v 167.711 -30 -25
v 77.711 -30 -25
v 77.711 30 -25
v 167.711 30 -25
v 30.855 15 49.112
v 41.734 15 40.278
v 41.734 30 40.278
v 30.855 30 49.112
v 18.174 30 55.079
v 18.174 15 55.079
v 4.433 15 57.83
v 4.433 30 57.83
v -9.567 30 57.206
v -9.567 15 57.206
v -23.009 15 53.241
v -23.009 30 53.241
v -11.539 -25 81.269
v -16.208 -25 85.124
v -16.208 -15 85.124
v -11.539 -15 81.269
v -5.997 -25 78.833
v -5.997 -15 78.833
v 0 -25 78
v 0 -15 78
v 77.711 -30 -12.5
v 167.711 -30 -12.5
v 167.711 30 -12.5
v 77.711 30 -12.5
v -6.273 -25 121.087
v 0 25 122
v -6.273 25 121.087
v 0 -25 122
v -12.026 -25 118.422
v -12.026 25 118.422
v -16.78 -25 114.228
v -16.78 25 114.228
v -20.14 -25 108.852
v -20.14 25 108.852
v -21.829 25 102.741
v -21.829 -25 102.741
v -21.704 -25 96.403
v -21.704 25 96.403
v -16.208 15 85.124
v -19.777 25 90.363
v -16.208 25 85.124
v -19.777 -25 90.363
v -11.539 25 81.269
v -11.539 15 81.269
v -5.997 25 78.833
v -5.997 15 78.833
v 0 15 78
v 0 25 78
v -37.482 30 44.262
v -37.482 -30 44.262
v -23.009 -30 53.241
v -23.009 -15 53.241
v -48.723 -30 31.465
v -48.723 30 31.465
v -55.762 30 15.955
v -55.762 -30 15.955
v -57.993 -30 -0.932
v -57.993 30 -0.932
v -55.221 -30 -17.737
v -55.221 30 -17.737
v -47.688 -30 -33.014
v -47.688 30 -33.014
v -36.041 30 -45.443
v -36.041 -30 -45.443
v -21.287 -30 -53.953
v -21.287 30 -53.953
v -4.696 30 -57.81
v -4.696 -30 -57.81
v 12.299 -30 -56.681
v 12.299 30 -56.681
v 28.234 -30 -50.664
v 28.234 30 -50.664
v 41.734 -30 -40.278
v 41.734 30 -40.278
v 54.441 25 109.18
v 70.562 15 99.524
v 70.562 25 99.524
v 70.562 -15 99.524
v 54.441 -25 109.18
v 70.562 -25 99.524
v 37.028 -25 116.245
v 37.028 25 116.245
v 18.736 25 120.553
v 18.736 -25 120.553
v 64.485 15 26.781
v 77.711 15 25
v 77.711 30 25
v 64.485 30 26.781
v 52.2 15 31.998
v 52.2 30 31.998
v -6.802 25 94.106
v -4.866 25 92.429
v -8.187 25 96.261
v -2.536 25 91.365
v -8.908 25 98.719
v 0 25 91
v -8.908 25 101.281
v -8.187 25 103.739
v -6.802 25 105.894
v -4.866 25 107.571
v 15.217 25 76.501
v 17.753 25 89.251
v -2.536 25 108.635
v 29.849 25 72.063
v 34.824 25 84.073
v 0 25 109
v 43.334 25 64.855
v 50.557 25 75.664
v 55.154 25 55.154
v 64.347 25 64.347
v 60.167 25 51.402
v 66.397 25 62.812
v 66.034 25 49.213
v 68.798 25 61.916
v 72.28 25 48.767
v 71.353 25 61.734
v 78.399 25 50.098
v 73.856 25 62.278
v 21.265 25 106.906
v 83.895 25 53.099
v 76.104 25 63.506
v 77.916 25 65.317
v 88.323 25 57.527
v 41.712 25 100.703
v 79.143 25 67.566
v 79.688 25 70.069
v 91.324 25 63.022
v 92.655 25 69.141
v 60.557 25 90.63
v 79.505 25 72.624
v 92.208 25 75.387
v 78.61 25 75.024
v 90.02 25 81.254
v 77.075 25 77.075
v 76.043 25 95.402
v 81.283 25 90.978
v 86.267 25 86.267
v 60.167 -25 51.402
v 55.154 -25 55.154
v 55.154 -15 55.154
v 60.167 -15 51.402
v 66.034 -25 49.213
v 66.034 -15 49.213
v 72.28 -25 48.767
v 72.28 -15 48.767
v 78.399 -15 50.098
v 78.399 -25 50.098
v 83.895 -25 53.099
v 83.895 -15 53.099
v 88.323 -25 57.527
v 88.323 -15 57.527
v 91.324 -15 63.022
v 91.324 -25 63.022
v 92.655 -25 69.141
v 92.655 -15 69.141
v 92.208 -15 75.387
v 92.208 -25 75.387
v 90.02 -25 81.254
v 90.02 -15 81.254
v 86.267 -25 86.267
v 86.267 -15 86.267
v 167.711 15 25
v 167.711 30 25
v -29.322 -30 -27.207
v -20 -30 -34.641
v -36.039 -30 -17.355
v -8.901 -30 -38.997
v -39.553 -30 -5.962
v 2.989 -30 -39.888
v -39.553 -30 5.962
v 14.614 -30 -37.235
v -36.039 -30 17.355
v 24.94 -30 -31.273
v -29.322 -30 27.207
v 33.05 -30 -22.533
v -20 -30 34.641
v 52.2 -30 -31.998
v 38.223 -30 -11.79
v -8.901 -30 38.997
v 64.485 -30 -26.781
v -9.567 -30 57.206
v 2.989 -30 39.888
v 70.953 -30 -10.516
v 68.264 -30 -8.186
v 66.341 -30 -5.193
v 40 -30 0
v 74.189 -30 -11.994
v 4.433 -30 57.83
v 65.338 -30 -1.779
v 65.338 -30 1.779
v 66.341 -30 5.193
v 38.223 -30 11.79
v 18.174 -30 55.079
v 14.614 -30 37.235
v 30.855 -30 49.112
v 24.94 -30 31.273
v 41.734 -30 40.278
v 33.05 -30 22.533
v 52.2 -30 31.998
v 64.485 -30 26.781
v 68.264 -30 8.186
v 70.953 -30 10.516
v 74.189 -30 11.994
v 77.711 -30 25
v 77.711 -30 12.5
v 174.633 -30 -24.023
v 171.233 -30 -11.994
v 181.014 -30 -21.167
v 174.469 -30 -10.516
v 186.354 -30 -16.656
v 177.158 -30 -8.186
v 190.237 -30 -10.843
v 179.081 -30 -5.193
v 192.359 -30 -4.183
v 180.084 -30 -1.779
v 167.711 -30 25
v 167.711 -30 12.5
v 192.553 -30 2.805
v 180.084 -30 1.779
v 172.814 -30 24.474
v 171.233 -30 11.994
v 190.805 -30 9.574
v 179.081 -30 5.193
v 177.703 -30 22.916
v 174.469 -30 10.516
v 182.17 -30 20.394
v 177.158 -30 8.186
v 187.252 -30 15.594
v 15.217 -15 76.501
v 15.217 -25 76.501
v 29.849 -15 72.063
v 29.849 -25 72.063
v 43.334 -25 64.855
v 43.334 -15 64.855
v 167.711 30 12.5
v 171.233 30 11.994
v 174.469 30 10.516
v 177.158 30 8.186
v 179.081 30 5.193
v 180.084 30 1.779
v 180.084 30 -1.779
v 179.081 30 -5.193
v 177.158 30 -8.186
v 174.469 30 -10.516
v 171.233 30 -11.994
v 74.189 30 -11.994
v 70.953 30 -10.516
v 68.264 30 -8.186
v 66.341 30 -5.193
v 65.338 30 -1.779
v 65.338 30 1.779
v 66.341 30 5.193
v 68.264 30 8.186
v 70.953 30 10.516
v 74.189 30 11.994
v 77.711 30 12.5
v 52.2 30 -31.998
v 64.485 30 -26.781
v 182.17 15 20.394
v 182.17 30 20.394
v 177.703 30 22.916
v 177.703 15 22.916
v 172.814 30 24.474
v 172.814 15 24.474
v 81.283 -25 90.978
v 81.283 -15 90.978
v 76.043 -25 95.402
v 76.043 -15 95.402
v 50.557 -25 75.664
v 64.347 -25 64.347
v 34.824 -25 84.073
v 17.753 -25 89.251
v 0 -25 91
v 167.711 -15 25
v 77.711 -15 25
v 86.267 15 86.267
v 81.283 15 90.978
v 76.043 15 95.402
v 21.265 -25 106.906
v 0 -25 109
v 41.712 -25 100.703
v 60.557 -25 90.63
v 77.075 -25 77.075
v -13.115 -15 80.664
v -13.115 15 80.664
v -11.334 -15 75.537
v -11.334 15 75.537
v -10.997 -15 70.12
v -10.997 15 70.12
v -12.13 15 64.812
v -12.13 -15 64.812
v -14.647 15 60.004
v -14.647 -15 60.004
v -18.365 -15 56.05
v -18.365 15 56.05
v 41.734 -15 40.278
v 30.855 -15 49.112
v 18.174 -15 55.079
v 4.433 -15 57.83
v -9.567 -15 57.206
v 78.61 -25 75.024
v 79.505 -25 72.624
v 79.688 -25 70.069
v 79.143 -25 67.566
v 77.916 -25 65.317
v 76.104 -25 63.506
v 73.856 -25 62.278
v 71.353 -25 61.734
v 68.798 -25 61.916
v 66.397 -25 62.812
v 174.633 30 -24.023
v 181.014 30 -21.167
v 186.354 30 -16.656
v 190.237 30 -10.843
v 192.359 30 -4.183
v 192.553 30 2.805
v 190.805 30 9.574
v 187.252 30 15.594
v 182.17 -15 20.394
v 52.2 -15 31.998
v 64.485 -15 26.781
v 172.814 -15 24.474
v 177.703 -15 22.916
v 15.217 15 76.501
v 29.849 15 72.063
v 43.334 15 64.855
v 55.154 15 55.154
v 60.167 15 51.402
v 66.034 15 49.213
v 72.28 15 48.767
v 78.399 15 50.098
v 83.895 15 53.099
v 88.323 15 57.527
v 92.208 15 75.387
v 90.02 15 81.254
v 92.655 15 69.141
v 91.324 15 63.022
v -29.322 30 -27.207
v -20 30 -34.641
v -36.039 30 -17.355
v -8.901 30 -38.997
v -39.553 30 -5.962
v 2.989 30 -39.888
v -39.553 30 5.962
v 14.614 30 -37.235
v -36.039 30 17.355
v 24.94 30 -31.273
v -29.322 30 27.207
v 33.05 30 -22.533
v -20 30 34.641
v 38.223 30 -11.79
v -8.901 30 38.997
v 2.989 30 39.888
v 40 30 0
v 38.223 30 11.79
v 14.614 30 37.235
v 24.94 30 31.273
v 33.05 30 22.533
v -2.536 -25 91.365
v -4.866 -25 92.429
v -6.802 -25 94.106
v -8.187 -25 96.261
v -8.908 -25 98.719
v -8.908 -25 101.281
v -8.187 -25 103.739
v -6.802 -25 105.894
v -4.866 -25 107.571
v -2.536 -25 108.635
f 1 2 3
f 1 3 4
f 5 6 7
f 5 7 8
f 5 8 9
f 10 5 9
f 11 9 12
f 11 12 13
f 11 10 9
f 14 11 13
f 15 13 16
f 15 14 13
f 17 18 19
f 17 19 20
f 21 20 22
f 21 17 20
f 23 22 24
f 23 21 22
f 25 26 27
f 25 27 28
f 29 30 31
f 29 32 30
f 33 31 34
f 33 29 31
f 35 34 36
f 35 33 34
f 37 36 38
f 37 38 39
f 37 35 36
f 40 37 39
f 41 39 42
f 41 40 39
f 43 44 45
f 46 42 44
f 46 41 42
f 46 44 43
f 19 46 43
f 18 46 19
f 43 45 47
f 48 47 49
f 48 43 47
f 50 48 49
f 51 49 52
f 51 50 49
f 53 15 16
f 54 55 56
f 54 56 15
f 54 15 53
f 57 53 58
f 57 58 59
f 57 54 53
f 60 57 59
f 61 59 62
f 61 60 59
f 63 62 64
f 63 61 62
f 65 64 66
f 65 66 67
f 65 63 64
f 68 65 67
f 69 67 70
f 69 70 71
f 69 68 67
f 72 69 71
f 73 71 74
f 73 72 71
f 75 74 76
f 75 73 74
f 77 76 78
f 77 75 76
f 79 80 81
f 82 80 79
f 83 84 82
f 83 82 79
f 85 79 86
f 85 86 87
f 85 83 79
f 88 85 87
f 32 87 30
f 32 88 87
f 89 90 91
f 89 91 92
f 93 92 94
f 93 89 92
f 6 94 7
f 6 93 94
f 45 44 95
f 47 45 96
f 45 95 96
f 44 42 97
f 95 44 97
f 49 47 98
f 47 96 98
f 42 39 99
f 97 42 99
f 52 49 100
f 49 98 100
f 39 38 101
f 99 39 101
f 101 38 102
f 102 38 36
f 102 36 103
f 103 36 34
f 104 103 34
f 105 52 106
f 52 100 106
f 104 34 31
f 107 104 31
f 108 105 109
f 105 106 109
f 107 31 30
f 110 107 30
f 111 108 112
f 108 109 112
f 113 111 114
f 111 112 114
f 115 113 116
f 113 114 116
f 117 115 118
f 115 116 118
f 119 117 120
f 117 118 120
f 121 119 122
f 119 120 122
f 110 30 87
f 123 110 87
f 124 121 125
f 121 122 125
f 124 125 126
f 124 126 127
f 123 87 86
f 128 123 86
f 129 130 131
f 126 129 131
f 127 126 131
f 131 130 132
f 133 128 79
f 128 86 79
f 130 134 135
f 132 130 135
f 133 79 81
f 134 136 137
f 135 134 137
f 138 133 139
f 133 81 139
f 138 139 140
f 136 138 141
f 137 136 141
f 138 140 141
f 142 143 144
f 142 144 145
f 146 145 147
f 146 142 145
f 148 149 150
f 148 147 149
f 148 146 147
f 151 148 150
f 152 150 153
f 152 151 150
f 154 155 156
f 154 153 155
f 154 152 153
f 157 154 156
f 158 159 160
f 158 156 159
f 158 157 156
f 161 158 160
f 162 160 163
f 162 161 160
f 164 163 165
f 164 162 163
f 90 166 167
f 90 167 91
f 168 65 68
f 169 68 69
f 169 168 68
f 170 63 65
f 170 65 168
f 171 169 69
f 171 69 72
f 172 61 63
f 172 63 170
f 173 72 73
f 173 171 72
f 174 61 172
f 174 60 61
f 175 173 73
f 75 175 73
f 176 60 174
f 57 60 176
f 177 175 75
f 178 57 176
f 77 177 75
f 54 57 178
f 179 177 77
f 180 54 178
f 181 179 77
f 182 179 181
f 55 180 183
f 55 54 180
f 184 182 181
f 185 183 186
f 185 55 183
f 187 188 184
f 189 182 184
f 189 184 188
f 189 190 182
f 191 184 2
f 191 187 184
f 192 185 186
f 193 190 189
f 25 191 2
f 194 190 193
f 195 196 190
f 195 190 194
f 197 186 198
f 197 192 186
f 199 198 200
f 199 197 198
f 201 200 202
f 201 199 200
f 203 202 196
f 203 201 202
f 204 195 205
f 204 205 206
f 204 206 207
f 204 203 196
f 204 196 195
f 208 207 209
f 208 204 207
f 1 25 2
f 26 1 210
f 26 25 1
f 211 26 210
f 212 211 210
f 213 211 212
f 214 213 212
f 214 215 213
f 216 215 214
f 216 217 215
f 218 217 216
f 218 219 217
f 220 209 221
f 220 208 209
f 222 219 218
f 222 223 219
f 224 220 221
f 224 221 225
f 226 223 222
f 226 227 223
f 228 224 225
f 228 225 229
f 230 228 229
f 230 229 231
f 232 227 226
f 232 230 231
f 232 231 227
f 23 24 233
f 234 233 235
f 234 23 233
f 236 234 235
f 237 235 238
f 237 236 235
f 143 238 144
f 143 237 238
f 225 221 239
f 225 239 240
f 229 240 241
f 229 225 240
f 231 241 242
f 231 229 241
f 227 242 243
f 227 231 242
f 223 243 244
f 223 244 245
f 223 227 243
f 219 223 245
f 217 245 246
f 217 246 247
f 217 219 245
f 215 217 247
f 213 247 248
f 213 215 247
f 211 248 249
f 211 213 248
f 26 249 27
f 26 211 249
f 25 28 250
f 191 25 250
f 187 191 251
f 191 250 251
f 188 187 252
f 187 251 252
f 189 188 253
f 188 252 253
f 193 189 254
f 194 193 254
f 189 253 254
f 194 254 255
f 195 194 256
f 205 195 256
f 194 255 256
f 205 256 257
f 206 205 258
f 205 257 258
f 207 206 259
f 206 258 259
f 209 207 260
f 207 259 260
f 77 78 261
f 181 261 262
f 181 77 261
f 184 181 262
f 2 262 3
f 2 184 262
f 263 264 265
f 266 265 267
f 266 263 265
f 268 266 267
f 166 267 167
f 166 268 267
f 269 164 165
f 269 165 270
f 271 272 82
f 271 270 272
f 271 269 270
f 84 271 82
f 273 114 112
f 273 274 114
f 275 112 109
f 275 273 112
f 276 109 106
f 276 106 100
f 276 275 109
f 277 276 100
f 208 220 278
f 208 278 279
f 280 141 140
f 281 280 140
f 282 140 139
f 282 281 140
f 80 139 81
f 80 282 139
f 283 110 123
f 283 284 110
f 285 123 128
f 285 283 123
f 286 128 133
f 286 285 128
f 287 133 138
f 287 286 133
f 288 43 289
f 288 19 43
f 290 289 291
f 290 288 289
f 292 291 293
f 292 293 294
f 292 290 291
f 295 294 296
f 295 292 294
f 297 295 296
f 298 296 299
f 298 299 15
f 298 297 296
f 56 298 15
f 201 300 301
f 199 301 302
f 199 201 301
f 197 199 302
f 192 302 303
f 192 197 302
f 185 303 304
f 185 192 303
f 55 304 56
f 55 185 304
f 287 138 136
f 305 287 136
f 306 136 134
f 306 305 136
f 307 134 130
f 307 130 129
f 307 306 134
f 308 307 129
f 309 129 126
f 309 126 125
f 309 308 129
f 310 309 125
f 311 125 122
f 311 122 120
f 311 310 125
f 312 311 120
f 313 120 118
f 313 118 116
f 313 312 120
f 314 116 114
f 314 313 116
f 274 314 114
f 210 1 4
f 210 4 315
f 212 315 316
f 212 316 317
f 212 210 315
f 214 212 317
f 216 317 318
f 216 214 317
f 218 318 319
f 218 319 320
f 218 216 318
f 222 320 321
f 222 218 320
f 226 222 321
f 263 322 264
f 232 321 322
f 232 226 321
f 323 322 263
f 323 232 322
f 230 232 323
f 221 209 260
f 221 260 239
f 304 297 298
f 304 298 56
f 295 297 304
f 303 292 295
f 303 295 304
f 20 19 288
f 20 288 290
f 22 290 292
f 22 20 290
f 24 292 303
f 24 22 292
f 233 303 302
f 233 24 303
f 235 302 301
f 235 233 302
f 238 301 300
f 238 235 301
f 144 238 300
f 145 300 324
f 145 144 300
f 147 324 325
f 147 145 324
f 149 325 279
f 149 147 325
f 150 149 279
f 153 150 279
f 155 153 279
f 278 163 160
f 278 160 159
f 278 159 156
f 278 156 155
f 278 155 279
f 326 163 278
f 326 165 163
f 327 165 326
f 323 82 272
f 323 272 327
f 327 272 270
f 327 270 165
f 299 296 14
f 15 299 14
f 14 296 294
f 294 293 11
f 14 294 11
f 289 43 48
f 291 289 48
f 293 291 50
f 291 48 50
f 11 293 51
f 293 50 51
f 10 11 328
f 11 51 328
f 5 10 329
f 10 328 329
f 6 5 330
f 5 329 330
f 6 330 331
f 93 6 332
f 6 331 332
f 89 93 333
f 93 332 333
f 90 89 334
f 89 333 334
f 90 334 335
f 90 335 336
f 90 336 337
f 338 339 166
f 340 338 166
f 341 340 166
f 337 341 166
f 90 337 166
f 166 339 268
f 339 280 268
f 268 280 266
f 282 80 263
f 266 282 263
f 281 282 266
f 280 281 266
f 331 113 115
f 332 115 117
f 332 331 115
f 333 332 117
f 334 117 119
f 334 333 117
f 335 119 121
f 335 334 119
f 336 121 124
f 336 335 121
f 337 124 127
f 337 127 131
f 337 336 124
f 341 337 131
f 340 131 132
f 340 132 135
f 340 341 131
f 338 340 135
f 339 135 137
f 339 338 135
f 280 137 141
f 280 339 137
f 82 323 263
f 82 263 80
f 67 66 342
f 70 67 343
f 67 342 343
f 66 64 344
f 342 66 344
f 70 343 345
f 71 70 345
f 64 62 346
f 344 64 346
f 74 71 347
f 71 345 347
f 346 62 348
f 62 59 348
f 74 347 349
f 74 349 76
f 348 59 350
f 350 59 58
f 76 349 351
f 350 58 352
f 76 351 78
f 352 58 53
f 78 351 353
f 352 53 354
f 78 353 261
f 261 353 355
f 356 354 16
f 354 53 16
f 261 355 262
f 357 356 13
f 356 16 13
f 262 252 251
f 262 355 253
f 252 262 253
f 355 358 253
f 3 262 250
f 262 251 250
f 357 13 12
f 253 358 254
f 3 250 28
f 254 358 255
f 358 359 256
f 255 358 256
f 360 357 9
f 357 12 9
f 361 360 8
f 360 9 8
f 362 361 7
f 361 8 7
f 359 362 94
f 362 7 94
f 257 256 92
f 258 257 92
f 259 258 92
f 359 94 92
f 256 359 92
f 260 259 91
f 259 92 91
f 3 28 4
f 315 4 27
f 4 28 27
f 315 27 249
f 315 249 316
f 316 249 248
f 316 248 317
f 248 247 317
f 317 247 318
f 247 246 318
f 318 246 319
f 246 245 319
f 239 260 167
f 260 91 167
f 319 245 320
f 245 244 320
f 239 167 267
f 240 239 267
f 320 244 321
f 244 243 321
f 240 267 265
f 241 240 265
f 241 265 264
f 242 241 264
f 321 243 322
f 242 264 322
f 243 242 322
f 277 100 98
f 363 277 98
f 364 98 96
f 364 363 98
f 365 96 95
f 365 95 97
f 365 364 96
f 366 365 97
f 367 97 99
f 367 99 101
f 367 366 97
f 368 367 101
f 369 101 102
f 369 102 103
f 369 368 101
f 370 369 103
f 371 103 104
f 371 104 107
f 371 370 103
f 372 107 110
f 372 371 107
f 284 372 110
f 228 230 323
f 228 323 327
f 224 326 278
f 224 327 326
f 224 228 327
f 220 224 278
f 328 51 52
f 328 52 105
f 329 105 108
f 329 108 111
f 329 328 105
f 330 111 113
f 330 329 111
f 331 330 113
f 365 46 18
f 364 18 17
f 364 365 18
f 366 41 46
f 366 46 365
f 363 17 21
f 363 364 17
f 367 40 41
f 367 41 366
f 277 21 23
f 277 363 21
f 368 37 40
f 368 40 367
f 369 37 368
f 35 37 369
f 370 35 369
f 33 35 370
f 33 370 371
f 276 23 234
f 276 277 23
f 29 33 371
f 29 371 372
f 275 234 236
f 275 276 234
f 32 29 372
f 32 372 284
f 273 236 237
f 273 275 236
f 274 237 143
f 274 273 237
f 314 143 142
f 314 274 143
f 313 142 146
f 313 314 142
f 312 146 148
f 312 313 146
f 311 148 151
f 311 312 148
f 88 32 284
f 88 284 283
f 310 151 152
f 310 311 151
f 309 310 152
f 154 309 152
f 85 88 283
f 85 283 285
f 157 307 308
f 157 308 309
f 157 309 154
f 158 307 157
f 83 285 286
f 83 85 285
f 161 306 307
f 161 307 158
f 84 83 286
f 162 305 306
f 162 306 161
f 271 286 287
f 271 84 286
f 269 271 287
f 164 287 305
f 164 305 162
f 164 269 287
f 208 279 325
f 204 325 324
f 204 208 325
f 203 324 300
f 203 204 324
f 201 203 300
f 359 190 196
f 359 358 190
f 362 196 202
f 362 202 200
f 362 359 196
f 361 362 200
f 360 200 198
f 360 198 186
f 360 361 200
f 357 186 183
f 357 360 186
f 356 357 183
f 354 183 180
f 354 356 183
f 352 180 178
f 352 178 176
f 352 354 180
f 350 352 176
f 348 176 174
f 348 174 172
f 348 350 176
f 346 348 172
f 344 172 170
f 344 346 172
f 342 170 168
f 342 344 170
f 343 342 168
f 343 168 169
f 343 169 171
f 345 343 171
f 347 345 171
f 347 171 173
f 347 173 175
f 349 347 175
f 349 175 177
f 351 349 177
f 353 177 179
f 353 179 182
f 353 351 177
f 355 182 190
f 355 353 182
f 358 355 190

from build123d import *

# Parameters (mm, degrees)
F0_R     = 40
F1_DEPTH = 30
F2_DEPTH = 15
F3_DEPTH = 25


with BuildPart() as f1:
    # F0 (on Front) → F1 (new body, symmetric)
    with BuildSketch(Plane.XZ):
        with BuildLine():
            ThreePointArc((41.733687, -40.277778), (58.167604, -28.977662), (77.711003, -25))
            Line((77.711003, -25), (167.711003, -25))
            ThreePointArc((167.711003, -25), (191.531756, -7.587605), (182.1704, 20.39426))
            ThreePointArc((182.1704, 20.39426), (175.298608, 23.820752), (167.711003, 25))
            Line((167.711003, 25), (77.711003, 25))
            ThreePointArc((77.711003, 25), (58.167604, 28.977662), (41.733687, 40.277778))
            ThreePointArc((41.733687, 40.277778), (11.387237, 56.871177), (-23.008546, 53.241026))
            ThreePointArc((-23.008546, 53.241026), (-47.687518, -33.013643), (41.733687, -40.277778))
        make_face()
        Circle(F0_R, mode=Mode.SUBTRACT)
        with BuildLine():
            ThreePointArc((77.711003, -12.5), (65.211003, 0), (77.711003, 12.5))
            Line((77.711003, 12.5), (167.711003, 12.5))
            ThreePointArc((167.711003, 12.5), (180.211003, 0), (167.711003, -12.5))
            Line((167.711003, -12.5), (77.711003, -12.5))
        make_face(mode=Mode.SUBTRACT)
    extrude(amount=F1_DEPTH, both=True)

    # F0 (on Front) → F2 (join, symmetric)
    with BuildSketch(Plane.XZ):
        with BuildLine():
            ThreePointArc((-16.207991, 85.12381), (-11.382532, 67.427879), (-23.008546, 53.241026))
            ThreePointArc((-23.008546, 53.241026), (11.387237, 56.871177), (41.733687, 40.277778))
            ThreePointArc((41.733687, 40.277778), (58.167604, 28.977662), (77.711003, 25))
            Line((77.711003, 25), (167.711003, 25))
            ThreePointArc((167.711003, 25), (175.298608, 23.820752), (182.1704, 20.39426))
            Line((182.1704, 20.39426), (70.561858, 99.523988))
            ThreePointArc((70.561858, 99.523988), (78.694101, 93.226812), (86.267027, 86.267027))
            ThreePointArc((86.267027, 86.267027), (86.267027, 55.154329), (55.154329, 55.154329))
            ThreePointArc((55.154329, 55.154329), (29.849308, 72.062604), (0, 78))
            ThreePointArc((0, 78), (-8.852226, 79.859541), (-16.207991, 85.12381))
        make_face()
    extrude(amount=F2_DEPTH, both=True)

    # F0 (on Front) → F3 (join, symmetric)
    with BuildSketch(Plane.XZ):
        with BuildLine():
            ThreePointArc((0, 122), (-20.140459, 108.852226), (-16.207991, 85.12381))
            ThreePointArc((-16.207991, 85.12381), (-8.852226, 79.859541), (0, 78))
            ThreePointArc((0, 78), (29.849308, 72.062604), (55.154329, 55.154329))
            ThreePointArc((55.154329, 55.154329), (86.267027, 55.154329), (86.267027, 86.267027))
            ThreePointArc((86.267027, 86.267027), (78.694101, 93.226812), (70.561858, 99.523988))
            ThreePointArc((70.561858, 99.523988), (37.027513, 116.245272), (0, 122))
        make_face()
        with BuildLine():
            ThreePointArc((0, 91), (-9, 100), (0, 109))
            ThreePointArc((0, 109), (41.712494, 100.702869), (77.074639, 77.074639))
            ThreePointArc((77.074639, 77.074639), (77.074639, 64.346717), (64.346717, 64.346717))
            ThreePointArc((64.346717, 64.346717), (34.824192, 84.073037), (0, 91))
        make_face(mode=Mode.SUBTRACT)
    extrude(amount=F3_DEPTH, both=True)


solid = f1.part
